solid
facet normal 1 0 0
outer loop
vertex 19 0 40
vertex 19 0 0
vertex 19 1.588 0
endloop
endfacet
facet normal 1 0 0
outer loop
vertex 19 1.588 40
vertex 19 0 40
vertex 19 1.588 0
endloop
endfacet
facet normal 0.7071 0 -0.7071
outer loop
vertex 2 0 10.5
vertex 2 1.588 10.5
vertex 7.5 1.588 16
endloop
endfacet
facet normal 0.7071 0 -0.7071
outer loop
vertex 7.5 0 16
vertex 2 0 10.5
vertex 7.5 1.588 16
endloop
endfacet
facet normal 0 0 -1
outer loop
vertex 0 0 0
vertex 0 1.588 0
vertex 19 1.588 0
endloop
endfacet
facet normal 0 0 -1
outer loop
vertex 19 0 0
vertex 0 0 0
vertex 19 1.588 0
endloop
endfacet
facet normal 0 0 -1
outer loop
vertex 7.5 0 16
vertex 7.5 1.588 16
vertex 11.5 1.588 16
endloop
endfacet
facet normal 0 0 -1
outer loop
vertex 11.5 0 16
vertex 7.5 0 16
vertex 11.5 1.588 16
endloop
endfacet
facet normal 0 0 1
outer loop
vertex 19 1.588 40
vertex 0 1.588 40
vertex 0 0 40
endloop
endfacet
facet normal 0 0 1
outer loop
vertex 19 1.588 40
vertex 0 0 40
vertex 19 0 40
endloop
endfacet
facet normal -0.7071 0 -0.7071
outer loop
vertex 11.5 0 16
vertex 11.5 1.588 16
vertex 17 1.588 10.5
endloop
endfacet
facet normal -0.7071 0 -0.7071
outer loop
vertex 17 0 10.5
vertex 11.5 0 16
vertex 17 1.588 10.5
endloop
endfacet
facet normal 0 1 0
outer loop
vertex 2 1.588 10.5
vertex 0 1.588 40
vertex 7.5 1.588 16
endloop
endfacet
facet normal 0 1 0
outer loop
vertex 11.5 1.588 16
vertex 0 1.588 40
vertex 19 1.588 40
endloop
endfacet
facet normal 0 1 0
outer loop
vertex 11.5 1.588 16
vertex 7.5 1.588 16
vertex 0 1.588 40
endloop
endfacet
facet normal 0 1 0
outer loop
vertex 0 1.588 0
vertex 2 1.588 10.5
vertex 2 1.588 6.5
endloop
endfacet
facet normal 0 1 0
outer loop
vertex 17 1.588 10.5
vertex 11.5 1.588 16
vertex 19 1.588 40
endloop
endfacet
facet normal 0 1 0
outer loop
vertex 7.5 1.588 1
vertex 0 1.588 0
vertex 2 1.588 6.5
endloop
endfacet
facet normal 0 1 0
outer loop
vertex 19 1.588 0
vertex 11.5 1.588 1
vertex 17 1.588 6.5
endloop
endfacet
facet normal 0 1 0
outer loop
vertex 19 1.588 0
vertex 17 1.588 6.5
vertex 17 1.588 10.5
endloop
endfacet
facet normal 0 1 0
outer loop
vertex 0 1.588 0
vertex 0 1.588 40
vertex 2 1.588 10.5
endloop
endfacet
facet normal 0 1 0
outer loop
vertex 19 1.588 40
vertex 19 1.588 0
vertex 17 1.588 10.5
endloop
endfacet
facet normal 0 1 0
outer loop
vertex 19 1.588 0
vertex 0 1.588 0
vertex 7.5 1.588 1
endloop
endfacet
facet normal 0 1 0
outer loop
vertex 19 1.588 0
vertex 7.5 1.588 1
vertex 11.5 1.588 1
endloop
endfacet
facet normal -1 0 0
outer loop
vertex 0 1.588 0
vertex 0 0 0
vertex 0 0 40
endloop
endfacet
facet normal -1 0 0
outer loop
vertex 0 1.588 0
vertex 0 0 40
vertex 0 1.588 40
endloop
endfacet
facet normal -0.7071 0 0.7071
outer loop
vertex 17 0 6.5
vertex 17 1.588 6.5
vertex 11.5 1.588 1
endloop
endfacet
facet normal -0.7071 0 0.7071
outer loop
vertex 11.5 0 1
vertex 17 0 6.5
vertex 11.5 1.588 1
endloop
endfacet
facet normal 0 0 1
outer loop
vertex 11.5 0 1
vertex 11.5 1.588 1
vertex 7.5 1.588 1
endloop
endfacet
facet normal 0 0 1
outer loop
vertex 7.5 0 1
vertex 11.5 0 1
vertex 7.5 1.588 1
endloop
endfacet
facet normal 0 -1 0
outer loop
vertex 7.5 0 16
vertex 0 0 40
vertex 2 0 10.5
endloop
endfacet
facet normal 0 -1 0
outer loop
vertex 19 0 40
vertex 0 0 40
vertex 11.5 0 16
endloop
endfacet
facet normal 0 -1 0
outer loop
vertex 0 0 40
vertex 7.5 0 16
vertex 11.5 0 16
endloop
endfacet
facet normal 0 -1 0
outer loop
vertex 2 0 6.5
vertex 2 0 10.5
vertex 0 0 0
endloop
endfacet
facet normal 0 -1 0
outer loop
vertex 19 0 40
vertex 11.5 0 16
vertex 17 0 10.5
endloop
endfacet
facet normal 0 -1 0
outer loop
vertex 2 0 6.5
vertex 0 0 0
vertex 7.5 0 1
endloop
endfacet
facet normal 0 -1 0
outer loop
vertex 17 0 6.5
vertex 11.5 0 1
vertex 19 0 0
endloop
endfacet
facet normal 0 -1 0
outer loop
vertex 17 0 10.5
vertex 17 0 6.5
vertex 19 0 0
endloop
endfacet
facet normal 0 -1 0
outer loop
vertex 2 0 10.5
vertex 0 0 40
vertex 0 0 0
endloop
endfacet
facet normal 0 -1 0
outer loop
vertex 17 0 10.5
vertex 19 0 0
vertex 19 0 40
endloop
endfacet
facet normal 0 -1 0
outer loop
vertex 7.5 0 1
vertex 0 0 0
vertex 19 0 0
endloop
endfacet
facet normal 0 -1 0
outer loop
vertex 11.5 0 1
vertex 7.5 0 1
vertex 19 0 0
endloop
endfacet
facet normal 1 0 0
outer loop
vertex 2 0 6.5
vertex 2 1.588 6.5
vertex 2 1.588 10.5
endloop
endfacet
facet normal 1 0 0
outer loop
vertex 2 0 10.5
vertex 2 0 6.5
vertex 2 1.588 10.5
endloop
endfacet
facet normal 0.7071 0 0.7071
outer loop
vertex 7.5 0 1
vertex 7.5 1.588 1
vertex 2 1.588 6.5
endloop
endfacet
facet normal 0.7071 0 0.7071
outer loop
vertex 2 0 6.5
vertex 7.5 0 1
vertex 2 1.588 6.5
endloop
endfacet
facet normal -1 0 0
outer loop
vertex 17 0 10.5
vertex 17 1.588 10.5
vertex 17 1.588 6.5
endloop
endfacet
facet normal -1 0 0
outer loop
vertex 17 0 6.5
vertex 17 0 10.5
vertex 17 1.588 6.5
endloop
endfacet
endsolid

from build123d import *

# Parameters (mm, degrees)
SKETCH1_W           = 19
SKETCH1_H           = 1.5875
BOSS_EXTRUDE1_DEPTH = 40
CUT_EXTRUDE1_DEPTH  = 45.31162552


with BuildPart() as part:
    # Sketch1 → Boss-Extrude1 (new body)
    with BuildSketch(Plane.XY):
        with Locations((9.5, 0.79375)):
            Rectangle(SKETCH1_W, SKETCH1_H)
    extrude(amount=BOSS_EXTRUDE1_DEPTH)

    # Sketch2 → Cut-Extrude1 (cut, through all)
    with BuildSketch(Plane(origin=(0, 1.5875, 0), x_dir=(1, 0, 0), z_dir=(0, 1, 0))):
        Polygon((2, -10.5), (7.5, -16), (11.5, -16), (17, -10.5), (17, -6.5), (11.5, -1), (7.5, -1), (2, -6.5), align=None)
    extrude(amount=-CUT_EXTRUDE1_DEPTH, mode=Mode.SUBTRACT)


solid = part.part
